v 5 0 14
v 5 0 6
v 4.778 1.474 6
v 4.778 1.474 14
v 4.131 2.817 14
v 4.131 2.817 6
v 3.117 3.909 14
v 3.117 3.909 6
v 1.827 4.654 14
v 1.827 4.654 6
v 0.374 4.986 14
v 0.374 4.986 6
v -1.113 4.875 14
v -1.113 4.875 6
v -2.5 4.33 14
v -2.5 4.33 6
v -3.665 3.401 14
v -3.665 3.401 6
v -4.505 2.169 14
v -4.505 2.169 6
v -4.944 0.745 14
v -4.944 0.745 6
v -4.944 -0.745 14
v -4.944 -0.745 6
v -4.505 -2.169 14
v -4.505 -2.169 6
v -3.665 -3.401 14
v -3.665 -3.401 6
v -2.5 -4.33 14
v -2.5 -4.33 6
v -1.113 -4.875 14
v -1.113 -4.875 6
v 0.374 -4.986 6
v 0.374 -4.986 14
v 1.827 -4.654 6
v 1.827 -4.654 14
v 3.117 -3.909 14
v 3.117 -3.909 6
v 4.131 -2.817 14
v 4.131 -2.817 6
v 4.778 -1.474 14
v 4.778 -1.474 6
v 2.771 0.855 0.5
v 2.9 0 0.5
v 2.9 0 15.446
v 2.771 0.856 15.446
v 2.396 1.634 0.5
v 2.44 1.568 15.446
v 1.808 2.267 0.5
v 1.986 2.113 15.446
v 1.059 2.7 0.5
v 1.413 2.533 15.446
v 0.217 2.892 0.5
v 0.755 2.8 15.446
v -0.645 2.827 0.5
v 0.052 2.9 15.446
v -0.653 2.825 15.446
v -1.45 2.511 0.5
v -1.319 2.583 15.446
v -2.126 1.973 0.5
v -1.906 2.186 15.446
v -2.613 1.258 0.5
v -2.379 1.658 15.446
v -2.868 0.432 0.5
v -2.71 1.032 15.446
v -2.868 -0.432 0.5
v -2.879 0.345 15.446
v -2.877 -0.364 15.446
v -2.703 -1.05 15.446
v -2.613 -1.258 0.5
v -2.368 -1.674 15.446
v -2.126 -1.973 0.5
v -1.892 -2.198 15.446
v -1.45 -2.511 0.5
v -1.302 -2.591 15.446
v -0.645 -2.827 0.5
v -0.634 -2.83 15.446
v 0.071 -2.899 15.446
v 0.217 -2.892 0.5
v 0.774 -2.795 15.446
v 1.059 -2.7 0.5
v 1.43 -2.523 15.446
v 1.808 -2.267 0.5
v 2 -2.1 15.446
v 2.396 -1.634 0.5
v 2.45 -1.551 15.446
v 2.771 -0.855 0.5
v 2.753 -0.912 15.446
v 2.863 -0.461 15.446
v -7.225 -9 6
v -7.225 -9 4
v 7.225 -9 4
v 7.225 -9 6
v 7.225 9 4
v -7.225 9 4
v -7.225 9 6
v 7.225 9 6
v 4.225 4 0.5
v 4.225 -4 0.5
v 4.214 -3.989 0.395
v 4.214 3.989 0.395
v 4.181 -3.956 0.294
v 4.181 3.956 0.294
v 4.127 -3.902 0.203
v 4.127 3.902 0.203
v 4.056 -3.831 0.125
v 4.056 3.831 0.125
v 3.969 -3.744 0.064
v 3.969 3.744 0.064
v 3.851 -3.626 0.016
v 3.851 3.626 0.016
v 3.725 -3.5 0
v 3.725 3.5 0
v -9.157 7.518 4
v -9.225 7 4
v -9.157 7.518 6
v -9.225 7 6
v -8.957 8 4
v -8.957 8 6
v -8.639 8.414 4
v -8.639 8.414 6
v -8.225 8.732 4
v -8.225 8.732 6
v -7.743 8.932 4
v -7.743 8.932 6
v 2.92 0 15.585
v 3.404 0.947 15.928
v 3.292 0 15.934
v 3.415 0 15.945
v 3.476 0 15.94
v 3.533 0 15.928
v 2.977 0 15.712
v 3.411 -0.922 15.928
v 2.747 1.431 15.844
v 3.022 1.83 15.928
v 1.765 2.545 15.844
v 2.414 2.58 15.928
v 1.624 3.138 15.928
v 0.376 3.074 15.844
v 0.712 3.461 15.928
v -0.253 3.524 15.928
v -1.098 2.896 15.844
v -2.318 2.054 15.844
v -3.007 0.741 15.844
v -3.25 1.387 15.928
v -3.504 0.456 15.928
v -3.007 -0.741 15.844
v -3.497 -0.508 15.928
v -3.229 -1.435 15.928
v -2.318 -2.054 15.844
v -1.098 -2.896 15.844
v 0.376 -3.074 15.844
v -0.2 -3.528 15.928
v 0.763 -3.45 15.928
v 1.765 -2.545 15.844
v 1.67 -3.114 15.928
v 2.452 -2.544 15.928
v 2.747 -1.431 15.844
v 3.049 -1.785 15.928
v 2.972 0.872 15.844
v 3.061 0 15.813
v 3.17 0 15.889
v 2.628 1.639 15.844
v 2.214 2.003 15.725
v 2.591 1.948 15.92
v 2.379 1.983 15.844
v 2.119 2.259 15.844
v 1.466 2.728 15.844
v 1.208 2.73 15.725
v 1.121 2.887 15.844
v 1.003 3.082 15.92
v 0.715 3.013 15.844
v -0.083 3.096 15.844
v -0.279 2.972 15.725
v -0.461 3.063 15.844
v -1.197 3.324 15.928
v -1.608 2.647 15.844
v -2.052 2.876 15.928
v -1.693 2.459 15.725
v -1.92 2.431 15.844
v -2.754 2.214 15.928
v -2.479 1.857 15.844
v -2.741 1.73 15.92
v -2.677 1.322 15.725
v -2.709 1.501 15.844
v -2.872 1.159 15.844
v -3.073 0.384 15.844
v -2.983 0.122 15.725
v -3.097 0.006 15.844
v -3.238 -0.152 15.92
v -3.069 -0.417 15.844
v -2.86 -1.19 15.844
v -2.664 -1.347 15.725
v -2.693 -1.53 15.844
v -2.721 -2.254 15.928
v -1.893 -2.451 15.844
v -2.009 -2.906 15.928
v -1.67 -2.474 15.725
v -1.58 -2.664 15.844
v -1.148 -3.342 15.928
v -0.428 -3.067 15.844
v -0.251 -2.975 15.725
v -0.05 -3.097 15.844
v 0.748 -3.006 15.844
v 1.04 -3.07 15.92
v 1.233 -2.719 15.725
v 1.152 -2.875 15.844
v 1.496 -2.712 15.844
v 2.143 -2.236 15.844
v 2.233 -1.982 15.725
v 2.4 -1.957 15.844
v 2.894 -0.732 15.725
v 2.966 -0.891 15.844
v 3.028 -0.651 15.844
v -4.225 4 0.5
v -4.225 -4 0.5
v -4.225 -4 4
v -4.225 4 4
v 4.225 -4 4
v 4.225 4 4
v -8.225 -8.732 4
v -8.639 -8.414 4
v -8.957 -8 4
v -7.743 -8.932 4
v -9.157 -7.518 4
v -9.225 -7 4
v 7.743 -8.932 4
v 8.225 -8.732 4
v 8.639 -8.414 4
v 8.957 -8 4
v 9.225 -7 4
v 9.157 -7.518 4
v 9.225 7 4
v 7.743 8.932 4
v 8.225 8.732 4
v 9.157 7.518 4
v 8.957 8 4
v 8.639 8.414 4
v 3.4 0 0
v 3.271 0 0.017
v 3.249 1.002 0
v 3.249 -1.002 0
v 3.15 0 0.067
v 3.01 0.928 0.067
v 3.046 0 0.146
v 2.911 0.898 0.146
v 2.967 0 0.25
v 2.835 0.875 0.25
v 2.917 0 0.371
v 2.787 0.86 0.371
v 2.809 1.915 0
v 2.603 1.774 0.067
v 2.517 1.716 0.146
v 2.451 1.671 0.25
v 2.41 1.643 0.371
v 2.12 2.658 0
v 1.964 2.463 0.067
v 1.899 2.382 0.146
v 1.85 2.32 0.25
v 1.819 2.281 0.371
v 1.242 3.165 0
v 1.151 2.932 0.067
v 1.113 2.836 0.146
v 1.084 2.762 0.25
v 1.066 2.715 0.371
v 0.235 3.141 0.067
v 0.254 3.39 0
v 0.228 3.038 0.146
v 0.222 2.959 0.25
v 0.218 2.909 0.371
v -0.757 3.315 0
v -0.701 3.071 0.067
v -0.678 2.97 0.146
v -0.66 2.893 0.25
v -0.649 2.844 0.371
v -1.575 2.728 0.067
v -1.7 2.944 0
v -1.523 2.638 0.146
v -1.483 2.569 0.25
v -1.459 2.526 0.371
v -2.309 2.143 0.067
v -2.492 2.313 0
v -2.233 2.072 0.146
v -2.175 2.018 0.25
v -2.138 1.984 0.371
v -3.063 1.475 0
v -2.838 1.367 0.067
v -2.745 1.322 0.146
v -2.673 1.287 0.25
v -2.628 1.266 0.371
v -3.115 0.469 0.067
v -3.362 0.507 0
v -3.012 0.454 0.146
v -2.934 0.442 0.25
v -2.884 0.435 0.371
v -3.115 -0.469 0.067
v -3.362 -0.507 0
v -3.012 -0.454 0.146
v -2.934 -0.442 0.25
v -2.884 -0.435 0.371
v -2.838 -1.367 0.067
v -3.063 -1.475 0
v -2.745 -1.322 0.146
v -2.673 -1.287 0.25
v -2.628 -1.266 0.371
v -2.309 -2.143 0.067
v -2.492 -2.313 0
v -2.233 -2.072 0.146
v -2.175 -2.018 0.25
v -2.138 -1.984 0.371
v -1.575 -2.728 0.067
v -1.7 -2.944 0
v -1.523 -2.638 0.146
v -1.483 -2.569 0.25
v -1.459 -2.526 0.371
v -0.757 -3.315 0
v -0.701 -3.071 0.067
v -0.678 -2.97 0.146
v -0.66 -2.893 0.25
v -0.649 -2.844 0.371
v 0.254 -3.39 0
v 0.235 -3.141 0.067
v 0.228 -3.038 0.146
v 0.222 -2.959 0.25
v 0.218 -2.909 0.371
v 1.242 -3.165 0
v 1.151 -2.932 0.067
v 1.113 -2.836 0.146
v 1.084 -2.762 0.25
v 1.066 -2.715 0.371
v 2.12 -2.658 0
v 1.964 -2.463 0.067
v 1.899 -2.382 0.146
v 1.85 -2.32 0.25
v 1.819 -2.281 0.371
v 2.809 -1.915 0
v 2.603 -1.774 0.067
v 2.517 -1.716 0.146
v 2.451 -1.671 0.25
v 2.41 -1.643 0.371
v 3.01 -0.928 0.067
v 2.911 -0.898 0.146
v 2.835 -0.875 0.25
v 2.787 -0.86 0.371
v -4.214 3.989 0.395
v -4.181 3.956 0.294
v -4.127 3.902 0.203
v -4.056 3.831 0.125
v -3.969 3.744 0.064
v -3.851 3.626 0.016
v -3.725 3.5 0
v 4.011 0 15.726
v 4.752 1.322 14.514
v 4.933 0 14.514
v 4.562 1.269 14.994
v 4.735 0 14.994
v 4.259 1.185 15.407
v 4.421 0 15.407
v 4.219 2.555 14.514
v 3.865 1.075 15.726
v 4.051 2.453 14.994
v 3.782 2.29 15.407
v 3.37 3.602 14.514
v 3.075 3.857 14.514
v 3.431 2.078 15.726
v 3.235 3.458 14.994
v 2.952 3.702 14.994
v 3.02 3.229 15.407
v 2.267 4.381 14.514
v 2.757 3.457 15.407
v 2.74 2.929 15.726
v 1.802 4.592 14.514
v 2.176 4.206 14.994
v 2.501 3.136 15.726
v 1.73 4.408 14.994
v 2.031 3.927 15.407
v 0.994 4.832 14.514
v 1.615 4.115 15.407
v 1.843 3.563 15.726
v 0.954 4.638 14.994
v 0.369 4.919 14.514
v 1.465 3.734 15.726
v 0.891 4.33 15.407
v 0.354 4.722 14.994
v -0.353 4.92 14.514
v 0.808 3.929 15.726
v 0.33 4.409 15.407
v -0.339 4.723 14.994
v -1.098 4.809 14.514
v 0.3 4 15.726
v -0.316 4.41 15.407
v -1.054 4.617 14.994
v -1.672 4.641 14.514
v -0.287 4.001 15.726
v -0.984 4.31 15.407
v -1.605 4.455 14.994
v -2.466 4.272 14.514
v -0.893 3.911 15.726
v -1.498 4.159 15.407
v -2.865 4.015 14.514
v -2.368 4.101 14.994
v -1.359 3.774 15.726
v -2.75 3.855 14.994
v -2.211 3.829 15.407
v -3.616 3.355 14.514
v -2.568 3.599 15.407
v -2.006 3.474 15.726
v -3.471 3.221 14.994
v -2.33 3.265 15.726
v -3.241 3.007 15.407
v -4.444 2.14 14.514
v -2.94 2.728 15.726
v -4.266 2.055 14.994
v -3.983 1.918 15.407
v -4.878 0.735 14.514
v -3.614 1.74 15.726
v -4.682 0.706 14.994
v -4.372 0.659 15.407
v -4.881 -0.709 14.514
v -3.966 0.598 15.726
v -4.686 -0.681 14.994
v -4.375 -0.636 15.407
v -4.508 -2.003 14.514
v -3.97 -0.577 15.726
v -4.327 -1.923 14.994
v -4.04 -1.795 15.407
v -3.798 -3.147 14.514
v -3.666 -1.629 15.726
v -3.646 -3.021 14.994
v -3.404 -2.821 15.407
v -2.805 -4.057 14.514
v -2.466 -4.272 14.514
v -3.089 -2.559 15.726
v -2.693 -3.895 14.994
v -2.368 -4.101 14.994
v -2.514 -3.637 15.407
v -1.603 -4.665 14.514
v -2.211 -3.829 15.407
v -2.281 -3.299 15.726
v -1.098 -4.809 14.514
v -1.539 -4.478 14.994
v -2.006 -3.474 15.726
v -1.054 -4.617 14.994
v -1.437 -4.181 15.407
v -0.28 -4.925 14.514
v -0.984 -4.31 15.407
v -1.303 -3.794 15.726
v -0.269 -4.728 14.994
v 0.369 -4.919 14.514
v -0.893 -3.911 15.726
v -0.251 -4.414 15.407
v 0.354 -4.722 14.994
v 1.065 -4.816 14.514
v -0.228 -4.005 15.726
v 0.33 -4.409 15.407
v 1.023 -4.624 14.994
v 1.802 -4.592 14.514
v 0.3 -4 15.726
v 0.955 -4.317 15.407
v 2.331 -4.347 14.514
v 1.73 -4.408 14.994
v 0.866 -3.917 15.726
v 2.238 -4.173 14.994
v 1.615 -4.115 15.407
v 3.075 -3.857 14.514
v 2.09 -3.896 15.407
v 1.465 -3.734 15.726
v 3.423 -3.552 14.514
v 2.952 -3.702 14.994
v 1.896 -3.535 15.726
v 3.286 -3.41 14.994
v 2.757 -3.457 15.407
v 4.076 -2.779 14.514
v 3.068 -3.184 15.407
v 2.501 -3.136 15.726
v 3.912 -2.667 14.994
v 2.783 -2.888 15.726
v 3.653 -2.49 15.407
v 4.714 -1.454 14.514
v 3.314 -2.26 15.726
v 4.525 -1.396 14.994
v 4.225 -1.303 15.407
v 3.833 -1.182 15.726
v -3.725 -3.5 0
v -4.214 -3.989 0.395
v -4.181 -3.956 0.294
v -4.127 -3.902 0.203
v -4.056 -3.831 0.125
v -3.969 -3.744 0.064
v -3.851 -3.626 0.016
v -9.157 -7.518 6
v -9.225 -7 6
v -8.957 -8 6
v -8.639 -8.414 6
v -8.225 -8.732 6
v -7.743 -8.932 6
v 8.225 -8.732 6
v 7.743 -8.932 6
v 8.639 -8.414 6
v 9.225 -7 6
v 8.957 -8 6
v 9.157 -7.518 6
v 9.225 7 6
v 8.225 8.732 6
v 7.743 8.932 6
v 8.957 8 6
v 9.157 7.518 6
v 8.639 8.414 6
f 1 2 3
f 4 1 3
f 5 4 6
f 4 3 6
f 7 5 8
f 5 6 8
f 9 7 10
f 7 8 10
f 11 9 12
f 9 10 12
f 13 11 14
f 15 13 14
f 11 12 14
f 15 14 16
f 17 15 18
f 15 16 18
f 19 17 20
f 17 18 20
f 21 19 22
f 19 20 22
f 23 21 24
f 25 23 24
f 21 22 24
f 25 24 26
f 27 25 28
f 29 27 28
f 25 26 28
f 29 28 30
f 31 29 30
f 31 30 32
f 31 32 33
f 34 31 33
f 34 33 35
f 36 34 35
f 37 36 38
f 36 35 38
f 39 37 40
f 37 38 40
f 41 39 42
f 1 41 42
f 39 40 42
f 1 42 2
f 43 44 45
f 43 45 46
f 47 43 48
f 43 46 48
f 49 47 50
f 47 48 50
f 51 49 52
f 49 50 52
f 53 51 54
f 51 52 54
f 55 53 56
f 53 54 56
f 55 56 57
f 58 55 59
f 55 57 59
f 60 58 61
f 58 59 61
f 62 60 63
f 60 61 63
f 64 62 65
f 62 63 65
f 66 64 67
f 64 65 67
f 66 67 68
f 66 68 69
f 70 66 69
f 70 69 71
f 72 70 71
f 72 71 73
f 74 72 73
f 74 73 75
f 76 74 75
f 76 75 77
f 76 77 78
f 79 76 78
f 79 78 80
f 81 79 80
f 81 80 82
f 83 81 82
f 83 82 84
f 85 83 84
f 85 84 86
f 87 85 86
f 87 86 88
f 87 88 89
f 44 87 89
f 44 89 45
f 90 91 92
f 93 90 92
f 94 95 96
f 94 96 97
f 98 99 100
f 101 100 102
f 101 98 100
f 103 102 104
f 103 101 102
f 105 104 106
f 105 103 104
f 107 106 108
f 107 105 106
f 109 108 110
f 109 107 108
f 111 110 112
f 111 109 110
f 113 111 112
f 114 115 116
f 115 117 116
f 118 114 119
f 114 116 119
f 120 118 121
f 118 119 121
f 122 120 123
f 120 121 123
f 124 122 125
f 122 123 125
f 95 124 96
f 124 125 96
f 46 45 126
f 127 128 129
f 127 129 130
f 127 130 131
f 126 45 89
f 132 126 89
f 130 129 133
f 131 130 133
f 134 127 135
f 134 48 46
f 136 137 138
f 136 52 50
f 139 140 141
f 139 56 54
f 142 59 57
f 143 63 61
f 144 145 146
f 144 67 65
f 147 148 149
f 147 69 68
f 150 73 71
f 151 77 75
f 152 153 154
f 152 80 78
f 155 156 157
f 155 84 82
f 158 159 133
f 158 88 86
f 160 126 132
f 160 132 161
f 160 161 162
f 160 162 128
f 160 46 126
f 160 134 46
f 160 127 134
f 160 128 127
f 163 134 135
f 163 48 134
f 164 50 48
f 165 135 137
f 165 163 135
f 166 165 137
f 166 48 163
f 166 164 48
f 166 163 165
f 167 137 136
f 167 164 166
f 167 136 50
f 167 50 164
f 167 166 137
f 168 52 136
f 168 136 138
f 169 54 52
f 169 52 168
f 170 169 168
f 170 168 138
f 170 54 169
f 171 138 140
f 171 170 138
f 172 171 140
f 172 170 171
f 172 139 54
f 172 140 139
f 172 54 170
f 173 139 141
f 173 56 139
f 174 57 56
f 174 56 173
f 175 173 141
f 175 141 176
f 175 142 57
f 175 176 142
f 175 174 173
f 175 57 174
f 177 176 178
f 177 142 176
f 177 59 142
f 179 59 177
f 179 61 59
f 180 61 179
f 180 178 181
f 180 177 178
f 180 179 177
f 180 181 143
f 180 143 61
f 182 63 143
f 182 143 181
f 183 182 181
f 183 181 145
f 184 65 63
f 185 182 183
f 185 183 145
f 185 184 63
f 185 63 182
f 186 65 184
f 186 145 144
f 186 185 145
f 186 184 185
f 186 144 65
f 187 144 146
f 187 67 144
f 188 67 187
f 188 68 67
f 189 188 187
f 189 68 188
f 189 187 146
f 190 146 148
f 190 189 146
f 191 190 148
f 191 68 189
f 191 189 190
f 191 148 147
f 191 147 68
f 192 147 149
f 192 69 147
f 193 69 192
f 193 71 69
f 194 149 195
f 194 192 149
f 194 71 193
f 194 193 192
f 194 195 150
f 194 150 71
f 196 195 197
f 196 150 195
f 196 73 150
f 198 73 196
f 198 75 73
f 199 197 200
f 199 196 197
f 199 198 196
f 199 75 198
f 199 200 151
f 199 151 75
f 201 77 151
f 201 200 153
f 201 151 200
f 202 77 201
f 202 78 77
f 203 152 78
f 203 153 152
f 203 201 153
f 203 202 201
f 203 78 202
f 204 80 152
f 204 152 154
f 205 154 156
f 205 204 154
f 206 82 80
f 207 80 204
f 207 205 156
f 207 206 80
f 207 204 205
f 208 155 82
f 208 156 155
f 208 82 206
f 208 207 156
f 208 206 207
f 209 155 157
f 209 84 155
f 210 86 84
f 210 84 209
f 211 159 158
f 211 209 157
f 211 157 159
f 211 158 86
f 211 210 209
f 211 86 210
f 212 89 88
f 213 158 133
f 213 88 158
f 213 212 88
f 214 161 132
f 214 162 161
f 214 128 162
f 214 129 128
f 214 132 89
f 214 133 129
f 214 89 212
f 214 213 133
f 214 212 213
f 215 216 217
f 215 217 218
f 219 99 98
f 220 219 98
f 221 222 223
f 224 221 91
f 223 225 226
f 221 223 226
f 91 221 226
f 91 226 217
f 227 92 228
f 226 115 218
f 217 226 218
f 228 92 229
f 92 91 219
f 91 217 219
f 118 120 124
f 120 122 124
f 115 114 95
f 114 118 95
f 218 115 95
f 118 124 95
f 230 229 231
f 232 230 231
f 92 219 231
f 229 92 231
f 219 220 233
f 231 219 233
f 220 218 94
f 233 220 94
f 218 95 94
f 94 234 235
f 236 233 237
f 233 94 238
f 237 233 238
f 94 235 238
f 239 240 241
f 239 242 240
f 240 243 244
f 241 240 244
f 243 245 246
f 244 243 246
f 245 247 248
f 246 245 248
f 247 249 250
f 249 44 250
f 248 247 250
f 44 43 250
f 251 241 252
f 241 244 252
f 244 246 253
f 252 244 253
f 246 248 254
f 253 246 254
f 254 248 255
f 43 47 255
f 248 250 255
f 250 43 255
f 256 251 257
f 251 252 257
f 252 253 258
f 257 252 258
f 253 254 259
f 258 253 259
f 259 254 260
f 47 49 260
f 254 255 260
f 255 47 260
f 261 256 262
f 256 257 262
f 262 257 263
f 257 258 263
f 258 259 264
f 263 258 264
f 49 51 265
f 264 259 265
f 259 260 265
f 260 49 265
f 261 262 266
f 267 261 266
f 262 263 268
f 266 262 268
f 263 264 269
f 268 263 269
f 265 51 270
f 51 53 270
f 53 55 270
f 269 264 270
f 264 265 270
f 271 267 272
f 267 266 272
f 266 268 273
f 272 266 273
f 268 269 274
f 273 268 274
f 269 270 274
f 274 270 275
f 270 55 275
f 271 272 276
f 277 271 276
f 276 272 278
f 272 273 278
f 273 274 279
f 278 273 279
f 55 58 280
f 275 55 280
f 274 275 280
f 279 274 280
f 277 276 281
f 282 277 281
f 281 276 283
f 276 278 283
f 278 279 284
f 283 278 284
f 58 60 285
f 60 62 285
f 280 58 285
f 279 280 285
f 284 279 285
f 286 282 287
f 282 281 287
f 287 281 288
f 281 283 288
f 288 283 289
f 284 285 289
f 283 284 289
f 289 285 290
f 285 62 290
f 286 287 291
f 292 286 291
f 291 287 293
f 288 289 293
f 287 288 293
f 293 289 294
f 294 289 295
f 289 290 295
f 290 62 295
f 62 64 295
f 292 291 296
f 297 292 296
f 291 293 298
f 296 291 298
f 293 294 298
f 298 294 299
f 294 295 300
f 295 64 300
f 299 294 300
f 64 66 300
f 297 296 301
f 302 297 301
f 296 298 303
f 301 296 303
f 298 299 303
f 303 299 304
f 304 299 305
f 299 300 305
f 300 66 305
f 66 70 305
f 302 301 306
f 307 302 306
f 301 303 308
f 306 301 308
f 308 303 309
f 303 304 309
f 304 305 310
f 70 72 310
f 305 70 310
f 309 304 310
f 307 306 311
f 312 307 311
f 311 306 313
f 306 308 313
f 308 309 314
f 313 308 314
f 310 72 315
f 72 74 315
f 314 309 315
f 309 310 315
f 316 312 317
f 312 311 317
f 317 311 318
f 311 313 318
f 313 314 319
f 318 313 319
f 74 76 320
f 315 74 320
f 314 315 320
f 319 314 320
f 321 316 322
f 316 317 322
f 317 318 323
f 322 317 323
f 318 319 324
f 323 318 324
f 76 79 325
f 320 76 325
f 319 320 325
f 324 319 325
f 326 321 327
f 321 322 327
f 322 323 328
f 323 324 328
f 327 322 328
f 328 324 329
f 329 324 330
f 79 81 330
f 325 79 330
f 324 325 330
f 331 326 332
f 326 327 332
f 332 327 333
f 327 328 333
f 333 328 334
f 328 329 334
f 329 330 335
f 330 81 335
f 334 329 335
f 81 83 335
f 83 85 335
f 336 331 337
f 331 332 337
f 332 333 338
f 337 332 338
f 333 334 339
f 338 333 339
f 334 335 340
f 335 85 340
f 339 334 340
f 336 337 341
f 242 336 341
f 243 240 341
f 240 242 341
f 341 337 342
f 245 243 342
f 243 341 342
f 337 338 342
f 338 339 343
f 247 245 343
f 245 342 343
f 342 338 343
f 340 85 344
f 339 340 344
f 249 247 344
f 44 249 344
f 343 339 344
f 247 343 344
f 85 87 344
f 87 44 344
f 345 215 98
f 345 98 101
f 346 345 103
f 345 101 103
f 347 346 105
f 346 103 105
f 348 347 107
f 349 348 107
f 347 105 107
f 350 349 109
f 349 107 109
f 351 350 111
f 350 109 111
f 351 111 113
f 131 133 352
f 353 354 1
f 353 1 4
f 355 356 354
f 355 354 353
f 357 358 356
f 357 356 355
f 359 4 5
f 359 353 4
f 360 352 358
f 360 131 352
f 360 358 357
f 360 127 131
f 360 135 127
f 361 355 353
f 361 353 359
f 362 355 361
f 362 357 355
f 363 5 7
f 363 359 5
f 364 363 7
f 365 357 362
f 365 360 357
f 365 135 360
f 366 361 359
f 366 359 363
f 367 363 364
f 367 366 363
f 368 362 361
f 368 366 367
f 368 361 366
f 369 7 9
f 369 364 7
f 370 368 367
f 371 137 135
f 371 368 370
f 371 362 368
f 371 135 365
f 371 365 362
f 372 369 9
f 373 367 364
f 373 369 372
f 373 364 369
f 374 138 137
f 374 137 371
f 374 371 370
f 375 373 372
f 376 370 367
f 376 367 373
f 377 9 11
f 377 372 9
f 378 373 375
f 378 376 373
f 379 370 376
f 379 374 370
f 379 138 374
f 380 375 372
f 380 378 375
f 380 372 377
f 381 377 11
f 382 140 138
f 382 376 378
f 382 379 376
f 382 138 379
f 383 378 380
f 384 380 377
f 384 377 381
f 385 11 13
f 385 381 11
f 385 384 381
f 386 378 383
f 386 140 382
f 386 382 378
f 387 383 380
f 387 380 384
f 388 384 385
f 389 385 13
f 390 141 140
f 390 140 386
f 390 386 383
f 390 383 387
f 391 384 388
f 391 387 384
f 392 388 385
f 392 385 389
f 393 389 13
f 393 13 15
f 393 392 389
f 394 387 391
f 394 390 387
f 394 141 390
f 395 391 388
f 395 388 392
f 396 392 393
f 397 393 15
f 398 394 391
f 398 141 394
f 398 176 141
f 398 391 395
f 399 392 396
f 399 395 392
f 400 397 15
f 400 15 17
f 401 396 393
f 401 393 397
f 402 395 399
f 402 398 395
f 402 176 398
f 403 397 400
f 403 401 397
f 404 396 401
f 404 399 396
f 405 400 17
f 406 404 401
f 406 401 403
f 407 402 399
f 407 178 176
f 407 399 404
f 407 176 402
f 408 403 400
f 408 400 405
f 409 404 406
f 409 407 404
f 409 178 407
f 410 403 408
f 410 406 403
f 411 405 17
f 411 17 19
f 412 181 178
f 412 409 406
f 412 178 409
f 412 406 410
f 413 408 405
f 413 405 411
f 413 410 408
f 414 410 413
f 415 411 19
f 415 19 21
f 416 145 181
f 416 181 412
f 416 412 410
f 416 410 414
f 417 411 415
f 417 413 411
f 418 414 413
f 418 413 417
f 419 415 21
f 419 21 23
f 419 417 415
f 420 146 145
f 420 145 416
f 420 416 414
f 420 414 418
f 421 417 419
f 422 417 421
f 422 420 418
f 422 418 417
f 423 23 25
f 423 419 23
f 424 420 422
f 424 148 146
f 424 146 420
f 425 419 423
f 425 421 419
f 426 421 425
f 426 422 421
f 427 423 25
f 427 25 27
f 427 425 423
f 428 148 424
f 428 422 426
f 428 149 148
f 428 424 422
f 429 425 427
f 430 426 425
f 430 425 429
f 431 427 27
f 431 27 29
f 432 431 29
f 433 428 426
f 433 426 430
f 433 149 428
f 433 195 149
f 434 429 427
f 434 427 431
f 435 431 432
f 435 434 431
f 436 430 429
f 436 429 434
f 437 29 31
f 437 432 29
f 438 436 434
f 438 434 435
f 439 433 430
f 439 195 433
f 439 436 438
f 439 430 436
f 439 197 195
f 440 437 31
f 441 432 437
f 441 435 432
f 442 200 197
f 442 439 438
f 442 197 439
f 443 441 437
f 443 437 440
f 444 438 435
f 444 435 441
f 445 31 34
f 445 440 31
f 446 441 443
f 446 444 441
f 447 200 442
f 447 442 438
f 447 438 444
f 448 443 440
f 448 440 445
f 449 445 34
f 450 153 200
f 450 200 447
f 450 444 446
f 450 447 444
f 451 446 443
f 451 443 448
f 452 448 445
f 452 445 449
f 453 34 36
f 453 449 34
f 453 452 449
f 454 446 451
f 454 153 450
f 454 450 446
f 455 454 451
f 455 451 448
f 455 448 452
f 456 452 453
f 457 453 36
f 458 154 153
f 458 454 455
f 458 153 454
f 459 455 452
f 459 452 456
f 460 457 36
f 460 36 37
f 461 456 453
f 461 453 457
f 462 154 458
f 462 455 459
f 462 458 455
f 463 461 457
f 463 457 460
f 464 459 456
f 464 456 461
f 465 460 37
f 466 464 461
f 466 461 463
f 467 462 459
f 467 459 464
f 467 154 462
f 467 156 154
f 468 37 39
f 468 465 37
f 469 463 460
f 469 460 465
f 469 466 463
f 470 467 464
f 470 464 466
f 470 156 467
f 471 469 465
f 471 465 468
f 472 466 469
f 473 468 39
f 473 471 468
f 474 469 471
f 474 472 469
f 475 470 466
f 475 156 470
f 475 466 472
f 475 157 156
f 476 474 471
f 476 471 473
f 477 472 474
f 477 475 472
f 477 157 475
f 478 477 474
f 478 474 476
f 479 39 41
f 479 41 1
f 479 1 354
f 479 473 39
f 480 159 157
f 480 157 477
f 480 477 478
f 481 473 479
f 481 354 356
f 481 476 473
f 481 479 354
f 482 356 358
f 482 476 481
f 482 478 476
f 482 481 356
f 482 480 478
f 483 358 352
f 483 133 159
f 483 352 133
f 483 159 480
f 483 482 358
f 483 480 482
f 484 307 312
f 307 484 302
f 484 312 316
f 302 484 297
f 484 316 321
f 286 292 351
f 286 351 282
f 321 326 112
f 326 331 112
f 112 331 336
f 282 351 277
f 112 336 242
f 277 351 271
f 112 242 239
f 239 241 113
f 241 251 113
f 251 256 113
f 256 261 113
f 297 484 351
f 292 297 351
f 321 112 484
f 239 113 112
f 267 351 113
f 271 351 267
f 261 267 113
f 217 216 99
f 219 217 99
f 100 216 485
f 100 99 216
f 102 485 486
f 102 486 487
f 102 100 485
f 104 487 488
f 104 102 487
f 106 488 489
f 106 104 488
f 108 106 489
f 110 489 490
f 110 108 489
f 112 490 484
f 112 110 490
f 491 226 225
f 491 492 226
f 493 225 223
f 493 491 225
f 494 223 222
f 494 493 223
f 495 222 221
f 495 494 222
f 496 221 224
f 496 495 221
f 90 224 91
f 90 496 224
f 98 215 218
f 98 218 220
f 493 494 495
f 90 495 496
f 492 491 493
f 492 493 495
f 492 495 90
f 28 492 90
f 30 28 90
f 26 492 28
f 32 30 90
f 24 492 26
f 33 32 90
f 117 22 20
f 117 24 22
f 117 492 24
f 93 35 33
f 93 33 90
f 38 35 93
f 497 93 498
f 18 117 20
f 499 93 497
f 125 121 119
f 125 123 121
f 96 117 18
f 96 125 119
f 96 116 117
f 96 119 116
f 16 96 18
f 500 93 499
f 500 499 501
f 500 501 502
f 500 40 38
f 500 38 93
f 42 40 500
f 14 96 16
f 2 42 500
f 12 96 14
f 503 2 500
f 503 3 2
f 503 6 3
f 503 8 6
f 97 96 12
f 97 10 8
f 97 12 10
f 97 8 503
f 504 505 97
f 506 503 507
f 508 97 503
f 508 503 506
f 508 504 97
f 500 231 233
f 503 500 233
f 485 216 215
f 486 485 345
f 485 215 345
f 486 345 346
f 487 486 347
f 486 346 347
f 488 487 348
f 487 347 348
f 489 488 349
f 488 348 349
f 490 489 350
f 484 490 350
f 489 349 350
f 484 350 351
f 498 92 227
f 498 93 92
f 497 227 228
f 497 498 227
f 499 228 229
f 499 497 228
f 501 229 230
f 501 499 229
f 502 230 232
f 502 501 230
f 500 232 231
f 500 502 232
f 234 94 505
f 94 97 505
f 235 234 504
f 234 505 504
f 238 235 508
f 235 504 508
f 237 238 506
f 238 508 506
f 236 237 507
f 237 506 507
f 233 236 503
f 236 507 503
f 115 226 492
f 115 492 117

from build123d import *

# Parameters (mm, degrees)
F0_W     = 8.45
F0_H     = 8
F1_DEPTH = 4
F2_W     = 18.45
F2_H     = 18
F3_DEPTH = 2
F4_R     = 5
F5_DEPTH = 10
F6_R     = 2.9
F7_DEPTH = 16.001
F8_R     = 2
F9_R     = 0.5


with BuildPart() as f1:
    # F0 (on Top) → F1 (new body)
    with BuildSketch(Plane.XY):
        Rectangle(F0_W, F0_H)
    extrude(amount=F1_DEPTH)

    # F2 (on face) → F3 (join)
    with BuildSketch(Plane.XY.offset(4)):
        Rectangle(F2_W, F2_H)
    extrude(amount=F3_DEPTH)

    # F4 (on face) → F5 (join)
    with BuildSketch(Plane.XY.offset(6)):
        Circle(F4_R)
    extrude(amount=F5_DEPTH)

    # F6 (on face) → F7 (cut, through all)
    with BuildSketch(Plane.XY.offset(16)):
        Circle(F6_R)
    extrude(amount=-F7_DEPTH, mode=Mode.SUBTRACT)

    # F8
    f8_edges = [f1.edges().sort_by_distance(p)[0] for p in [
        (-9.225, 9, 5),
        (9.225, 9, 5),
        (9.225, -9, 5),
        (-9.225, -9, 5),
        (-5, 0, 16),
    ]]
    fillet(f8_edges, radius=F8_R)

    # F9
    f9_edges = [f1.edges().sort_by_distance(p)[0] for p in [
        (-2.9, 0, 16),
        (-2.9, 0, 0),
        (-4.225, 0, 0),
        (0, 4, 0),
        (0, -4, 0),
        (4.225, 0, 0),
    ]]
    fillet(f9_edges, radius=F9_R)


solid = f1.part
